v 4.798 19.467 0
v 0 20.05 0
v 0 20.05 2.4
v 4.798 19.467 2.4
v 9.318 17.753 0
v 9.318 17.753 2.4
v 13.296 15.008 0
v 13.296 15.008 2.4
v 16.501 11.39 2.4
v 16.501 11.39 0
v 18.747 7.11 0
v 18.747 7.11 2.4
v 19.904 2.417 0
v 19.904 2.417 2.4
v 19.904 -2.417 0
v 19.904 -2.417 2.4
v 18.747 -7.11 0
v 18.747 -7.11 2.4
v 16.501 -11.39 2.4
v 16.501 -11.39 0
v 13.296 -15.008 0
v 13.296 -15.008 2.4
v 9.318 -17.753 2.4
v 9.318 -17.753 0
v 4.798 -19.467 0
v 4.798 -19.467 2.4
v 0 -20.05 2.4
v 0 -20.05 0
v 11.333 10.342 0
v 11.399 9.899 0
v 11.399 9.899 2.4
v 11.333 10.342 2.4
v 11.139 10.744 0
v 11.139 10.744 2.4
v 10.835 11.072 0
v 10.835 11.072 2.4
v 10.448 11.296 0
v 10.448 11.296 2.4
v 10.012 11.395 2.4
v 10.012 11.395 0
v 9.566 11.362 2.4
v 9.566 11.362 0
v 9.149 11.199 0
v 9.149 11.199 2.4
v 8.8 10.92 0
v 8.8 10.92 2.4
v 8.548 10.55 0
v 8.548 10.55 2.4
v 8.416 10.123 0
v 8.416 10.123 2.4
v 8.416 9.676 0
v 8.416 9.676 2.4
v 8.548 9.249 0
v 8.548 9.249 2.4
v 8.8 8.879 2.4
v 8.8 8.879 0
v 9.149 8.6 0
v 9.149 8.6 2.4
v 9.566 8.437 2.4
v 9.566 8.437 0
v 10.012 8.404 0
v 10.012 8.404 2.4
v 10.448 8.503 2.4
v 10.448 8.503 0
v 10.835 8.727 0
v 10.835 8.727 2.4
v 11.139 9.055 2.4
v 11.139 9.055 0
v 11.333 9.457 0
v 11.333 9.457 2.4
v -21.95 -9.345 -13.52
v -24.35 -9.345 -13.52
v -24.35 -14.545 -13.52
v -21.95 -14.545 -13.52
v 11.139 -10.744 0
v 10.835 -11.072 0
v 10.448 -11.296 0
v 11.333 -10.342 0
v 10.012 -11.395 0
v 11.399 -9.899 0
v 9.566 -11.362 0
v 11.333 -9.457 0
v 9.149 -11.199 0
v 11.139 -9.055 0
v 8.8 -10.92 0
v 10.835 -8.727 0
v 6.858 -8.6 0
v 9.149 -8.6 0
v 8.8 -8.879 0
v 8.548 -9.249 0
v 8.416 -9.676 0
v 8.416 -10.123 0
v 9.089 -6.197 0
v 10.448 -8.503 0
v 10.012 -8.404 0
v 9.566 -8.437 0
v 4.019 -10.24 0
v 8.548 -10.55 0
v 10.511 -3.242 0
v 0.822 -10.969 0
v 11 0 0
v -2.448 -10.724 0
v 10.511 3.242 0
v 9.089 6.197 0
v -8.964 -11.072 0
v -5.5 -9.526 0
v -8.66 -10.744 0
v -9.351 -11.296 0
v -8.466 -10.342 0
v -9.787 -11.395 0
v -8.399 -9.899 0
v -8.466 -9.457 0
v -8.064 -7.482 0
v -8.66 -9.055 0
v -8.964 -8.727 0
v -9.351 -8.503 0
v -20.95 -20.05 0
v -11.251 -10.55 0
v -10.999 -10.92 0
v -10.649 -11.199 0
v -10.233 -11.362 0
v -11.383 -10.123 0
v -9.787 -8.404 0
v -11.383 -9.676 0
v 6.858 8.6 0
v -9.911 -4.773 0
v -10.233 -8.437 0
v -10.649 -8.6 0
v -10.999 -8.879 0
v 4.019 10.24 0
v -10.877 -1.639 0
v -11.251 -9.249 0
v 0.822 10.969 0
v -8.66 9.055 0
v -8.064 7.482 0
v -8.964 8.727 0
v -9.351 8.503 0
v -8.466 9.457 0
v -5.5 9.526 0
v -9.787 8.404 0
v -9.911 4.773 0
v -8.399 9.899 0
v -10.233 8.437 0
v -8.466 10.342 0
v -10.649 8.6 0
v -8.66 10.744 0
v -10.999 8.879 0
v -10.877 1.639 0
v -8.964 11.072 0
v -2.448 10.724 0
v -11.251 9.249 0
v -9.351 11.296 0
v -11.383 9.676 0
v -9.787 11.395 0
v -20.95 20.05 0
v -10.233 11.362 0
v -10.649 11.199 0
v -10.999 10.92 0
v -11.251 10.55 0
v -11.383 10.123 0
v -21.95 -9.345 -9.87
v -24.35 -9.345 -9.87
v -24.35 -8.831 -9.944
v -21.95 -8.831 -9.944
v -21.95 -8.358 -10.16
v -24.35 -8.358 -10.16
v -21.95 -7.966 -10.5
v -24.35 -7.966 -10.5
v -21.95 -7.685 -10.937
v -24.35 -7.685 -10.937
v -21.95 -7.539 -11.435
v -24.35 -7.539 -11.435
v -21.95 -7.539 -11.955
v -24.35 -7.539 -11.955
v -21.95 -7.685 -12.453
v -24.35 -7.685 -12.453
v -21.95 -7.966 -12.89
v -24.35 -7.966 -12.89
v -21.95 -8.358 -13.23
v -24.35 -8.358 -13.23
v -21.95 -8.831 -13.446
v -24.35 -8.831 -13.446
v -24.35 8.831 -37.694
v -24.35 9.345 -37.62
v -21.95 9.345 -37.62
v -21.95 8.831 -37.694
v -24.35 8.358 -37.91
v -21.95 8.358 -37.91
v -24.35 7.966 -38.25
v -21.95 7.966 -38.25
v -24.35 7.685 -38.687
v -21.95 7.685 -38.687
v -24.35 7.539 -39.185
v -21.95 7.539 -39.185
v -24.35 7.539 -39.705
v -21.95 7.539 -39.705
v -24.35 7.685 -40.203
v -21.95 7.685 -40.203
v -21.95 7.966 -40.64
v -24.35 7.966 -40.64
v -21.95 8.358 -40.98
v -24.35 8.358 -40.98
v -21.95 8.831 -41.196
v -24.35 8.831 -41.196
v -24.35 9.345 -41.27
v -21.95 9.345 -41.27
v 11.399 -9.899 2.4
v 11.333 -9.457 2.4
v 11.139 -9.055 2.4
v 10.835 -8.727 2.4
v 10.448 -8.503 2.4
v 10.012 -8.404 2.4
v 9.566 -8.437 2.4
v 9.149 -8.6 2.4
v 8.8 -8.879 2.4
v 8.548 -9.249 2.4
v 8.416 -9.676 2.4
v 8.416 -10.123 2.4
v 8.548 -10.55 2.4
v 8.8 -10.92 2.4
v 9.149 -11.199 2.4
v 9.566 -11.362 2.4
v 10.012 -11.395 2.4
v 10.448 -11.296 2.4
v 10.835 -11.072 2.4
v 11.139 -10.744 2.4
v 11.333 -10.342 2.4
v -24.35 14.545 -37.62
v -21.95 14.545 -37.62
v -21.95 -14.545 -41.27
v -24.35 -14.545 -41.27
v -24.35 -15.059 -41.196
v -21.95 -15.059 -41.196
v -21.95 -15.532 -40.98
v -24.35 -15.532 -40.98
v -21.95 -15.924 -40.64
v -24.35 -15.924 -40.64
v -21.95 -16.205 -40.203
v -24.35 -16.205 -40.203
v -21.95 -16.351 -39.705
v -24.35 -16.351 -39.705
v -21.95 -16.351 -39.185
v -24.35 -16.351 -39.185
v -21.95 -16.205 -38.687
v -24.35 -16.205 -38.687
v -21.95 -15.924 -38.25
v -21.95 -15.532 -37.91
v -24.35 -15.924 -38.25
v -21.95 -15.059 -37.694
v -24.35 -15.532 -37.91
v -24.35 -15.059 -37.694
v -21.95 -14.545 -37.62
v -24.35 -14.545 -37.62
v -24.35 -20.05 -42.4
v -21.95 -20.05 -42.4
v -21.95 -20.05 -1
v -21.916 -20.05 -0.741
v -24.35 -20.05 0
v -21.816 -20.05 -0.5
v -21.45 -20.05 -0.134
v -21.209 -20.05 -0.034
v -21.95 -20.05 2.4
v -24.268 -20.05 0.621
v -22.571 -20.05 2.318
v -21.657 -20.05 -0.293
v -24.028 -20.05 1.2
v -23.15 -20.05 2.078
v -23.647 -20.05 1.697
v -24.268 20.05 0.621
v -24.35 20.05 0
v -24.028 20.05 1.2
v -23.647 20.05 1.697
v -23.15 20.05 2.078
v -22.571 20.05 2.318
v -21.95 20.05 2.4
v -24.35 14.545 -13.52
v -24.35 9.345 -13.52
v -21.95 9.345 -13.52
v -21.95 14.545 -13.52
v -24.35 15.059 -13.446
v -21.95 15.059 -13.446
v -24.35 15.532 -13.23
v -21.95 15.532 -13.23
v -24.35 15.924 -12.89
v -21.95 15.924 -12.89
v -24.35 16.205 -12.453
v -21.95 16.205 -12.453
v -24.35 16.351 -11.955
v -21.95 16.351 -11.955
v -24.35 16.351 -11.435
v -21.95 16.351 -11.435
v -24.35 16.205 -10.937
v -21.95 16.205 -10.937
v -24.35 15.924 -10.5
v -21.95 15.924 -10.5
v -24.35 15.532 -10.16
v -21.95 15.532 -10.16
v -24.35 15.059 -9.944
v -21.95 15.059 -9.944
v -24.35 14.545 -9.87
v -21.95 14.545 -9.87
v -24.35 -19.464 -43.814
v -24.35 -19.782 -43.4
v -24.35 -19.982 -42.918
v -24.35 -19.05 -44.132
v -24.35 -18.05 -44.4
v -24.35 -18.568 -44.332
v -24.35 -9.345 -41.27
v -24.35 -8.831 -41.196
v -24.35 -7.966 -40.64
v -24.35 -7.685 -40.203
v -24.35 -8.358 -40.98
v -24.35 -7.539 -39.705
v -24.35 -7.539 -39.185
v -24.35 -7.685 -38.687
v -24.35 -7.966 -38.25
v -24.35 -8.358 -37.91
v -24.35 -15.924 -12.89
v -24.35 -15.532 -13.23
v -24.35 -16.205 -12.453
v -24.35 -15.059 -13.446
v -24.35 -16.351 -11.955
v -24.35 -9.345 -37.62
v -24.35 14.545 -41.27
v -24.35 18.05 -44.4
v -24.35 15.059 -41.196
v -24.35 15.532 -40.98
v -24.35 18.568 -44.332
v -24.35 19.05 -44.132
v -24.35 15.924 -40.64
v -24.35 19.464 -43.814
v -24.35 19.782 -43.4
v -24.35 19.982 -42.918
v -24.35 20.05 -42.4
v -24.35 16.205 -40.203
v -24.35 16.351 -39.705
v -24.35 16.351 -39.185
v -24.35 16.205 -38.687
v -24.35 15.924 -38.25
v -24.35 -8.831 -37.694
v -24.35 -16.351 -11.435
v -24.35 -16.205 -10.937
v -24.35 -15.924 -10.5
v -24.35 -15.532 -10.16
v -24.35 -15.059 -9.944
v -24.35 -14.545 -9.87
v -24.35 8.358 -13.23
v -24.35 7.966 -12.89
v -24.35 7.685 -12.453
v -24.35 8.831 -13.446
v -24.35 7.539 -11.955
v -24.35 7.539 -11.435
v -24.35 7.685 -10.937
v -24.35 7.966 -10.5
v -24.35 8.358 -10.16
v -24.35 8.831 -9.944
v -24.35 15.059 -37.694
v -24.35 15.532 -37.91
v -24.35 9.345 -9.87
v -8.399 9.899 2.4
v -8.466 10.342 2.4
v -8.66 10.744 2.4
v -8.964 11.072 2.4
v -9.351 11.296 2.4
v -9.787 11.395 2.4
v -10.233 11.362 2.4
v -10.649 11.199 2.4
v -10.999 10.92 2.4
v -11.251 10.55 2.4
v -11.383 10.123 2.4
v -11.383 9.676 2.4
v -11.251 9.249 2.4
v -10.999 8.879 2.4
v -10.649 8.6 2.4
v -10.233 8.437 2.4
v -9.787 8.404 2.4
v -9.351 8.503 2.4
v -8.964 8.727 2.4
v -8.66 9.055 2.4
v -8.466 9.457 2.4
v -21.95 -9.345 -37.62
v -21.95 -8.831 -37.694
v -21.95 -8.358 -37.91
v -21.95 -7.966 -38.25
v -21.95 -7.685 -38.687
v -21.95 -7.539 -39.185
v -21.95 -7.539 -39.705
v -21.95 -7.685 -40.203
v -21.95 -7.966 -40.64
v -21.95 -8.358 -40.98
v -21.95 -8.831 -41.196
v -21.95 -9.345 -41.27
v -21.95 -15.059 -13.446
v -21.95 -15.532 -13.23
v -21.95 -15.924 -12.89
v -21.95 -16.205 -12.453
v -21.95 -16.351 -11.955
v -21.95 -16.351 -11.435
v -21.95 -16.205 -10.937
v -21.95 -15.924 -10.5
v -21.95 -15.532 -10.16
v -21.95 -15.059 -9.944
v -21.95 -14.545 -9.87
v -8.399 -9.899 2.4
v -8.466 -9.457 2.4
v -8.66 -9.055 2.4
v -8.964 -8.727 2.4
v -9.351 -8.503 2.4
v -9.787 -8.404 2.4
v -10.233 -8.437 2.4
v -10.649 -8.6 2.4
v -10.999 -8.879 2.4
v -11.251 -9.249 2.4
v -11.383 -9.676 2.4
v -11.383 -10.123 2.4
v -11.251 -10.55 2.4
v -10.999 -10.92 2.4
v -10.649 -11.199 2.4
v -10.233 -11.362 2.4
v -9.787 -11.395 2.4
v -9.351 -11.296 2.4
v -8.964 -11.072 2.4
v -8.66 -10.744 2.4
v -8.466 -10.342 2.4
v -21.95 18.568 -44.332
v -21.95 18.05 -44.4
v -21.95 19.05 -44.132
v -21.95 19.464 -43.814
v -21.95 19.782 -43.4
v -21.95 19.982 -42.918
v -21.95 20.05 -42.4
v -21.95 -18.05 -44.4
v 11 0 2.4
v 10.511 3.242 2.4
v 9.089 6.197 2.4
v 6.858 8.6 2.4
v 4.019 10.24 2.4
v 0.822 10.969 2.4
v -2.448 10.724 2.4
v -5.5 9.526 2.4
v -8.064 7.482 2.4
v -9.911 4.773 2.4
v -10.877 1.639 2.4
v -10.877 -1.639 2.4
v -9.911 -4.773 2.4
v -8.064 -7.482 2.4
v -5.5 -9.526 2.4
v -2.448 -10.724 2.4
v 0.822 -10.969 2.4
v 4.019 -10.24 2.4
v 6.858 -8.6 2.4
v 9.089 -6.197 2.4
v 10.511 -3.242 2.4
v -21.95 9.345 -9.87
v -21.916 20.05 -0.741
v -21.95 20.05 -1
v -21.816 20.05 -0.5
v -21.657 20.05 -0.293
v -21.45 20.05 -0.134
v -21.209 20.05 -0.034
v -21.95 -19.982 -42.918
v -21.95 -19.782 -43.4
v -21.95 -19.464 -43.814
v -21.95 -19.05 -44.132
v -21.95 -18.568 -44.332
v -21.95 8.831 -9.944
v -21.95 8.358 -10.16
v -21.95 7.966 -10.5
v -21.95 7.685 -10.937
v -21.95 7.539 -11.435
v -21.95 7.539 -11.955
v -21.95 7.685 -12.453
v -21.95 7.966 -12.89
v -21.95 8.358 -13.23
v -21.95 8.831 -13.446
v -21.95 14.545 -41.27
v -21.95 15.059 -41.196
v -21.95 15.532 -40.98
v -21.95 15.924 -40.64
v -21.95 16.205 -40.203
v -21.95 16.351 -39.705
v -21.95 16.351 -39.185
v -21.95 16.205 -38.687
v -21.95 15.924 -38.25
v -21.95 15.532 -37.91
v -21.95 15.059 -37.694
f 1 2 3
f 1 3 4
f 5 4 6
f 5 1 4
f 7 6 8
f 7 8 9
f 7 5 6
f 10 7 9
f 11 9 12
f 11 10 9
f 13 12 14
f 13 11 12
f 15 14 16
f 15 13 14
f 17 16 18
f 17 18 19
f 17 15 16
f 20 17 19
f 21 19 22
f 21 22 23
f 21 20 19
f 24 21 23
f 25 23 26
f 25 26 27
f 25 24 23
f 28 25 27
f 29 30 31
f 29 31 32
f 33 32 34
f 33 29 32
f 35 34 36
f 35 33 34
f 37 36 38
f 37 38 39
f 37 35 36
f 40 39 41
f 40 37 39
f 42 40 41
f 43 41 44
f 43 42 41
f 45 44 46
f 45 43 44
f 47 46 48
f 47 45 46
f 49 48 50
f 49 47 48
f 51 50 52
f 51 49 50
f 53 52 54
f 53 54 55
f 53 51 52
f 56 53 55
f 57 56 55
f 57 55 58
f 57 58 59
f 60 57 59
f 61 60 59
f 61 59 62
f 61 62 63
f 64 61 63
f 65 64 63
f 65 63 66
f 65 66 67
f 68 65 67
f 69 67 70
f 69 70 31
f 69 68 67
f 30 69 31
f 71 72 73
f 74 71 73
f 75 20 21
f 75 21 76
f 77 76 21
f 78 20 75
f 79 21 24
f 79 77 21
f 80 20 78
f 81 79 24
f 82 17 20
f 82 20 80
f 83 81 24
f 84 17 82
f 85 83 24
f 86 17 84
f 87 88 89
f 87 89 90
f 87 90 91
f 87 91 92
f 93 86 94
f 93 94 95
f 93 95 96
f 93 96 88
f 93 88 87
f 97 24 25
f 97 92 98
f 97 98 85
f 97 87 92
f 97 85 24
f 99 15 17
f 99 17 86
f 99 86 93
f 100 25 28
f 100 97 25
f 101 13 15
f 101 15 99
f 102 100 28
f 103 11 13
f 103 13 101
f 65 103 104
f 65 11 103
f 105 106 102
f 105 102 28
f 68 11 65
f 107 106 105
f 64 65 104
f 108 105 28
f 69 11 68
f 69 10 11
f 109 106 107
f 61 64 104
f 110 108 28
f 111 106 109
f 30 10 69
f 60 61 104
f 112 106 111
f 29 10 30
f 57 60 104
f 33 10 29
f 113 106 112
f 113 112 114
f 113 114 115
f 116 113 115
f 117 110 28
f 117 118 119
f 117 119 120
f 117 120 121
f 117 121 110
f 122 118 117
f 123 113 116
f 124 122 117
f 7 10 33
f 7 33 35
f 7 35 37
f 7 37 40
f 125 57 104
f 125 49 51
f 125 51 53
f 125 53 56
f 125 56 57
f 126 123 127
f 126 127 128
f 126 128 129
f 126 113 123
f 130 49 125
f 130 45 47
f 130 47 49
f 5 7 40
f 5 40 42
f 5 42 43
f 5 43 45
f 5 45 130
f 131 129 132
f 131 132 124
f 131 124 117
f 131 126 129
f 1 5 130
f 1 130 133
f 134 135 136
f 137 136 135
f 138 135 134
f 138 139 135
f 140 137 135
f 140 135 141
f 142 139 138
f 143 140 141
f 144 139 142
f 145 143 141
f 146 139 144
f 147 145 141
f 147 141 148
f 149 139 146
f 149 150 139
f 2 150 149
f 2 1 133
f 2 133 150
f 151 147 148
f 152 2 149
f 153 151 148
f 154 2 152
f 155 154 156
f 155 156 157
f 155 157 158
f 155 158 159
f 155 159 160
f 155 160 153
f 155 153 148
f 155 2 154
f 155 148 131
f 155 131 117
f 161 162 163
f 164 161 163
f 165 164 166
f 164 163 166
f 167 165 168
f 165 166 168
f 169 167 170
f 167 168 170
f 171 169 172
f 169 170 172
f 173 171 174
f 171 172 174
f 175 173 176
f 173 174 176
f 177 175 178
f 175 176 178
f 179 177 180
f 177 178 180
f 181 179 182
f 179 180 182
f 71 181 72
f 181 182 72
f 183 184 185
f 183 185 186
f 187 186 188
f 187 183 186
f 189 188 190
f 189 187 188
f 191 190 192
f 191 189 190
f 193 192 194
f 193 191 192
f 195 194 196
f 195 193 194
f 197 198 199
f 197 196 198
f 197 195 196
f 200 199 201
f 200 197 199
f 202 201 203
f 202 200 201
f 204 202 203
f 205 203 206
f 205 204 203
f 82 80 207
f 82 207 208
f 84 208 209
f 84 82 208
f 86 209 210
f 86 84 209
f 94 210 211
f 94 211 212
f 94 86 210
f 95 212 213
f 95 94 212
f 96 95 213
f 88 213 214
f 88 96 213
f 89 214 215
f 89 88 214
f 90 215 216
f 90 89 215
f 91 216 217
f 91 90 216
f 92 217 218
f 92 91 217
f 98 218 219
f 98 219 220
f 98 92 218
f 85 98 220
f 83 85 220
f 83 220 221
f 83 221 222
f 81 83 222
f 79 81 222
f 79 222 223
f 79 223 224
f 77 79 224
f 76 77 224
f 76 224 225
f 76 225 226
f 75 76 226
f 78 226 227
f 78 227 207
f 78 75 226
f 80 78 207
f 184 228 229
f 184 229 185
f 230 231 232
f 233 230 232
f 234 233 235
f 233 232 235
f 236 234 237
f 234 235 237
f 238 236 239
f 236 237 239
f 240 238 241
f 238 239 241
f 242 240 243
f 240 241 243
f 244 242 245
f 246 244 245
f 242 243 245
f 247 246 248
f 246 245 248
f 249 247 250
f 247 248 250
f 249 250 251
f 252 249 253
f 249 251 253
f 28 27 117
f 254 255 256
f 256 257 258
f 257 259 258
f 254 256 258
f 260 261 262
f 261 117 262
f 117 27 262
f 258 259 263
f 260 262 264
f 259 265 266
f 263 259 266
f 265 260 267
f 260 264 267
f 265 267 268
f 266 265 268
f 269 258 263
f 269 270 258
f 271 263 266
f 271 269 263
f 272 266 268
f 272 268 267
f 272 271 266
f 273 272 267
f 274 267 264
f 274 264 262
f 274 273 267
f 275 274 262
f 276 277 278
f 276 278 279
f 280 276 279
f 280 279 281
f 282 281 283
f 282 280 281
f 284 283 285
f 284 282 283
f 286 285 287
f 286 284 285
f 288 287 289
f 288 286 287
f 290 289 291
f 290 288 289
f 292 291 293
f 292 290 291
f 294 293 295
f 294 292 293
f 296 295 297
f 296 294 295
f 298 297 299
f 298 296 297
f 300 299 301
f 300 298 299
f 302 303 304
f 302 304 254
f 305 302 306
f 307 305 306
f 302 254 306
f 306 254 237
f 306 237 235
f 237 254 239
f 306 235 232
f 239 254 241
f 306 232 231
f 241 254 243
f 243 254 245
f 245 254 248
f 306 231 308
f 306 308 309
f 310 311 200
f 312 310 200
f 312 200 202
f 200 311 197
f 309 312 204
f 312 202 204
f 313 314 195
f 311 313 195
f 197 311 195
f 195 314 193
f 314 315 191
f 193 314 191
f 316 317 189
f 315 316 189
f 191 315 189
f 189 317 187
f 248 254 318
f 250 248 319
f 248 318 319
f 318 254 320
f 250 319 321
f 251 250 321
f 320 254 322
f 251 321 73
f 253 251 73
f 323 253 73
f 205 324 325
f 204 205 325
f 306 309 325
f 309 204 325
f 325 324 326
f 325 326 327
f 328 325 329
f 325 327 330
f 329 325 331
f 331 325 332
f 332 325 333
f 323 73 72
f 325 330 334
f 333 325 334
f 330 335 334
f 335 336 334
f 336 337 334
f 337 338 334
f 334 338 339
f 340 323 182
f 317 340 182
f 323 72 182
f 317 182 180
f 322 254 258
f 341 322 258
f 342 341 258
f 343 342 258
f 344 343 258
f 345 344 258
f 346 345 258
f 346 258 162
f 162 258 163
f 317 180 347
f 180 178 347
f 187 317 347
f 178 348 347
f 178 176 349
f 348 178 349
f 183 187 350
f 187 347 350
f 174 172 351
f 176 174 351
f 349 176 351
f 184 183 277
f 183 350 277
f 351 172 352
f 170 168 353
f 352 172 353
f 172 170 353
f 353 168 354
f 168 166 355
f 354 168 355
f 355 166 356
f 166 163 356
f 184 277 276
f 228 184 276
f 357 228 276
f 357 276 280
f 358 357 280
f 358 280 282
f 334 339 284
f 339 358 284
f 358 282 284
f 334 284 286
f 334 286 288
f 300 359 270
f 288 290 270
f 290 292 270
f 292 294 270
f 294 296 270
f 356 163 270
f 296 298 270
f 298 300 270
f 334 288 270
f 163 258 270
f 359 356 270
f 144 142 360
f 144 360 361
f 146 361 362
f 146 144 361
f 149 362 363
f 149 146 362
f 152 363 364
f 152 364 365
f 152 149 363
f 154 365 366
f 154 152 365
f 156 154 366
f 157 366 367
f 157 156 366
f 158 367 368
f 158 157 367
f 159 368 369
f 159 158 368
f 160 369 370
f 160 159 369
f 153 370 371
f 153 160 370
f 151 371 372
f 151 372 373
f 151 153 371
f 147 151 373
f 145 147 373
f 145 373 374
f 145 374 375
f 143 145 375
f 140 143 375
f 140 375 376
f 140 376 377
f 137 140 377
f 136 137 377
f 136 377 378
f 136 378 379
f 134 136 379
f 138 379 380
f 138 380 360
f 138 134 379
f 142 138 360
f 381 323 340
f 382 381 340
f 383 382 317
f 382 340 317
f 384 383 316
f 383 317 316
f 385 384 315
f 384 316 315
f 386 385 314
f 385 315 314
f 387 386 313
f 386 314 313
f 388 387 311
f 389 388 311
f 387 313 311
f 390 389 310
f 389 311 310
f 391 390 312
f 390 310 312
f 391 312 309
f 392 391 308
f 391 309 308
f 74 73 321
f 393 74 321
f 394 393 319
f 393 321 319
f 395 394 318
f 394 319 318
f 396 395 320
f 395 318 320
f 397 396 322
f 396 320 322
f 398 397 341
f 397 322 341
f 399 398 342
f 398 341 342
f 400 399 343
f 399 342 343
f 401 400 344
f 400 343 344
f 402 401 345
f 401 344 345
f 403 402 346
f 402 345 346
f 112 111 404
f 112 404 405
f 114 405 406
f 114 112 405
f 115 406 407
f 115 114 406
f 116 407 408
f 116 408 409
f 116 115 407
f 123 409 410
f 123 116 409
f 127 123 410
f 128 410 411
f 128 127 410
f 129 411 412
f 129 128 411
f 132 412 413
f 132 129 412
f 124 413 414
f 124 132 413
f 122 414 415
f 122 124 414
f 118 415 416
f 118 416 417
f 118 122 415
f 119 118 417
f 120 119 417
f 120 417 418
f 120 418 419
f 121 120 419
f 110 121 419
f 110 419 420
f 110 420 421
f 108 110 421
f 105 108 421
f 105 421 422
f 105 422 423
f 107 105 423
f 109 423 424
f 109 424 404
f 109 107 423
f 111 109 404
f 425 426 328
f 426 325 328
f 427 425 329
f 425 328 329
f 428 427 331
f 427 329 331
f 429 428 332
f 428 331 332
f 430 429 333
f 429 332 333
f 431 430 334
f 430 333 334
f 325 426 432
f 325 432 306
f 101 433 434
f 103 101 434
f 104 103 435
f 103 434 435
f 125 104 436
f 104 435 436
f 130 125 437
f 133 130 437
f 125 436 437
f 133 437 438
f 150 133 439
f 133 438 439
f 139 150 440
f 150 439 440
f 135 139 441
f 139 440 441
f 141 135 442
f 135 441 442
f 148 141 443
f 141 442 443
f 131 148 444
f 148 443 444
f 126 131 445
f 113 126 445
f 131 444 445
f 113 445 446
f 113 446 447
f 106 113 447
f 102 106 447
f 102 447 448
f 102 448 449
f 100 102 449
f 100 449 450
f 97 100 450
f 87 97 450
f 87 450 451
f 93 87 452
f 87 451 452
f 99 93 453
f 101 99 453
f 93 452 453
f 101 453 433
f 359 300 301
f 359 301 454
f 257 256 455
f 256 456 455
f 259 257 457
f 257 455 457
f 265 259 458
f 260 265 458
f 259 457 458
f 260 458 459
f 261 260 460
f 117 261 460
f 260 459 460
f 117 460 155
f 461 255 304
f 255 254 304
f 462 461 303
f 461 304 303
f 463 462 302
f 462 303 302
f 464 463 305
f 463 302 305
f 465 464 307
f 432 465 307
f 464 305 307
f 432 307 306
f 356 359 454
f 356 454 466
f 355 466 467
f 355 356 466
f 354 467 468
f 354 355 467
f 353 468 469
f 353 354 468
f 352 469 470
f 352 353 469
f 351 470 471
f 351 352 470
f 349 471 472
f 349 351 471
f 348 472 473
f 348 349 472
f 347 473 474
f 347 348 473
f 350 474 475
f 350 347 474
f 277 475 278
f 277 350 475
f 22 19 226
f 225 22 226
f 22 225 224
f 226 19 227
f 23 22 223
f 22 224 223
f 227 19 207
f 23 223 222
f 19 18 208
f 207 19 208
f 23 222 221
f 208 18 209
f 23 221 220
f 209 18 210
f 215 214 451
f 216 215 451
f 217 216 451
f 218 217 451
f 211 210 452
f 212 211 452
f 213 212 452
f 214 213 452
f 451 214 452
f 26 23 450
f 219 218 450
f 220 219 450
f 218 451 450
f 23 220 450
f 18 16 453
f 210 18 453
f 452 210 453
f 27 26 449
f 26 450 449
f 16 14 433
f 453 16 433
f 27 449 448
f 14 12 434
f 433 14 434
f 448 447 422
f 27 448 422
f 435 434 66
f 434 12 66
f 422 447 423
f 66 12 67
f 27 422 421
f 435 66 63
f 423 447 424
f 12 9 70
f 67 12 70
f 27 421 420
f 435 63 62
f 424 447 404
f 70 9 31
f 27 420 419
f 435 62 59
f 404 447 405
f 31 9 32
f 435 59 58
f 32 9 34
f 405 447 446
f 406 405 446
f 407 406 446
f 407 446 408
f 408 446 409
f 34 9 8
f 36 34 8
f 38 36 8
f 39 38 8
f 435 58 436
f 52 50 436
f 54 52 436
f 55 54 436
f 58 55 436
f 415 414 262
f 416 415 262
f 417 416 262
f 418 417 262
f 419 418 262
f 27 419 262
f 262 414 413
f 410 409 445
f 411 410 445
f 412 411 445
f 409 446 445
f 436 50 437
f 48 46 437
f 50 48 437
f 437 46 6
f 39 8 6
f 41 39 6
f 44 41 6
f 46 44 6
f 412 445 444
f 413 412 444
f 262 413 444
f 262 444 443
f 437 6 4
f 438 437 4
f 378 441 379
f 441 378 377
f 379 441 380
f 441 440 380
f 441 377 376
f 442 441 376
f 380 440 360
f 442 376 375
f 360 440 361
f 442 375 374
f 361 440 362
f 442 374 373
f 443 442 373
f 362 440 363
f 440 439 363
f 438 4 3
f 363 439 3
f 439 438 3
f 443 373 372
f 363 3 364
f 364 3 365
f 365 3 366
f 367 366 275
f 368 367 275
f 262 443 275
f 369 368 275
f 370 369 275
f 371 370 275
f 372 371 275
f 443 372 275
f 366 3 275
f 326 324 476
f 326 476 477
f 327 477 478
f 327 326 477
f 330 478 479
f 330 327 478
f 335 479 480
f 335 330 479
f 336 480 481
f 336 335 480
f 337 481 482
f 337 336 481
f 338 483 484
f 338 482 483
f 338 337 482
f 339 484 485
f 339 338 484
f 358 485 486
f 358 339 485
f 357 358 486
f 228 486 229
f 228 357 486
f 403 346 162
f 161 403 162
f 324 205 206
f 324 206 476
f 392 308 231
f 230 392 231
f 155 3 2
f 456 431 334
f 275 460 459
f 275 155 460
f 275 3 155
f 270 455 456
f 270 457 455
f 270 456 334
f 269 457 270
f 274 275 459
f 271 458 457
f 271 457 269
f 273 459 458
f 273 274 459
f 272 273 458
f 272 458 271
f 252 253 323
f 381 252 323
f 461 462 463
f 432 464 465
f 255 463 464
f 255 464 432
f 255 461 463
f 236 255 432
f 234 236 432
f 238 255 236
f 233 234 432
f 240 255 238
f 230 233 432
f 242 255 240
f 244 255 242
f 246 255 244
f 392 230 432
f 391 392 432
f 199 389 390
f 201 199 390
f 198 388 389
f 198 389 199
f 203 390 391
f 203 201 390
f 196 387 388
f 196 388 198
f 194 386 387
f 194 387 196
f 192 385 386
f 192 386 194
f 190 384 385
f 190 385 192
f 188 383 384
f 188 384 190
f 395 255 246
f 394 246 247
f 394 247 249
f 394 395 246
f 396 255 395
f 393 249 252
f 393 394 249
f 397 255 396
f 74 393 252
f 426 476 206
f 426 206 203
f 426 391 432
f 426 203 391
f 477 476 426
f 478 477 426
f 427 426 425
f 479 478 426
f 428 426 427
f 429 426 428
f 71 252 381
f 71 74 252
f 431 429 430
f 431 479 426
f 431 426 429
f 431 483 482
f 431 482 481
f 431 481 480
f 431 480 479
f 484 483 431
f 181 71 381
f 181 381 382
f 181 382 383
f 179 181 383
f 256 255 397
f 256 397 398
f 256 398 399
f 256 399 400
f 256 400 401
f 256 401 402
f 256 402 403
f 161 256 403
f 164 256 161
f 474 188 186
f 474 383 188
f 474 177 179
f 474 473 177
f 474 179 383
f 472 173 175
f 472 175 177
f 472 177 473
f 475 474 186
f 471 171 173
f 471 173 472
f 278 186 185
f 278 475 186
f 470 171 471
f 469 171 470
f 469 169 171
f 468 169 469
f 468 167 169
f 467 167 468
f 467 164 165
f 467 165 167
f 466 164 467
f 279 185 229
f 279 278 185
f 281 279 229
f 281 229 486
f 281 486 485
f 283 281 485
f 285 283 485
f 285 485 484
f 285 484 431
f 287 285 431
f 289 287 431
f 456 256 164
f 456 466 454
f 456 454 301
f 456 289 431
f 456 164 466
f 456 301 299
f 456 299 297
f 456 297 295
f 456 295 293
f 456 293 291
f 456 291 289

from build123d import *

# Parameters (mm, degrees)
SKETCH1_R           = 1.5
BOSS_EXTRUDE1_DEPTH = 2.4
SKETCH2_W           = 2.4
SKETCH2_H           = 40.1
BOSS_EXTRUDE2_DEPTH = 44.4
FILLET2_R           = 1
FILLET3_R           = 2.4
FILLET4_R           = 2
CUT_EXTRUDE1_DEPTH  = 45.4
SKETCH4_R           = 4
CUT_EXTRUDE2_DEPTH  = 2.4
SKETCH5_R           = 11
CUT_EXTRUDE3_DEPTH  = 2.4


with BuildPart() as part:
    # Sketch1 → Boss-Extrude1 (new body)
    with BuildSketch(Plane.XY):
        with BuildLine():
            Line((0, -20.05), (-24.35, -20.05))
            Line((-24.35, -20.05), (-24.35, 20.05))
            Line((-24.35, 20.05), (0, 20.05))
            ThreePointArc((0, 20.05), (20.05, 0), (0, -20.05))
        make_face()
        with Locations((-9.899494937, -9.899494937)):
            Circle(SKETCH1_R, mode=Mode.SUBTRACT)
        with Locations((-9.899494937, 9.899494937)):
            Circle(SKETCH1_R, mode=Mode.SUBTRACT)
        with Locations((9.899494937, 9.899494937)):
            Circle(SKETCH1_R, mode=Mode.SUBTRACT)
        with Locations((9.899494937, -9.899494937)):
            Circle(SKETCH1_R, mode=Mode.SUBTRACT)
    extrude(amount=BOSS_EXTRUDE1_DEPTH)

    # Sketch2 → Boss-Extrude2 (add)
    with BuildSketch(Plane(origin=(0, 0, 0), x_dir=(-1, 0, 0), z_dir=(0, 0, -1))):
        with Locations((23.15, 0)):
            Rectangle(SKETCH2_W, SKETCH2_H)
    extrude(amount=BOSS_EXTRUDE2_DEPTH)

    # Fillet2
    fillet2_edges = [part.edges().sort_by_distance(p)[0] for p in [
        (-21.95, 0, 0),
    ]]
    fillet(fillet2_edges, radius=FILLET2_R)

    # Fillet3
    fillet3_edges = [part.edges().sort_by_distance(p)[0] for p in [
        (-24.35, 0, 2.4),
    ]]
    fillet(fillet3_edges, radius=FILLET3_R)

    # Fillet4
    fillet4_edges = [part.edges().sort_by_distance(p)[0] for p in [
        (-23.15, 20.05, -44.4),
        (-23.15, -20.05, -44.4),
    ]]
    fillet(fillet4_edges, radius=FILLET4_R)

    # Sketch3 → Cut-Extrude1 (cut, through all)
    with BuildSketch(Plane.ZY.offset(24.35)):
        with BuildLine():
            Line((-41.27, 9.345), (-41.27, 14.545))
            ThreePointArc((-41.27, 14.545), (-39.445, 16.37), (-37.62, 14.545))
            Line((-37.62, 14.545), (-37.62, 9.345))
            ThreePointArc((-37.62, 9.345), (-39.445, 7.52), (-41.27, 9.345))
        make_face()
        with BuildLine():
            Line((-13.52, 9.345), (-13.52, 14.545))
            ThreePointArc((-13.52, 14.545), (-11.695, 16.37), (-9.87, 14.545))
            Line((-9.87, 14.545), (-9.87, 9.345))
            ThreePointArc((-9.87, 9.345), (-11.695, 7.52), (-13.52, 9.345))
        make_face()
        with BuildLine():
            Line((-41.27, -9.345), (-41.27, -14.545))
            ThreePointArc((-41.27, -14.545), (-39.445, -16.37), (-37.62, -14.545))
            Line((-37.62, -14.545), (-37.62, -9.345))
            ThreePointArc((-37.62, -9.345), (-39.445, -7.52), (-41.27, -9.345))
        make_face()
        with BuildLine():
            Line((-13.52, -9.345), (-13.52, -14.545))
            ThreePointArc((-13.52, -14.545), (-11.695, -16.37), (-9.87, -14.545))
            Line((-9.87, -14.545), (-9.87, -9.345))
            ThreePointArc((-9.87, -9.345), (-11.695, -7.52), (-13.52, -9.345))
        make_face()
    extrude(amount=-CUT_EXTRUDE1_DEPTH, mode=Mode.SUBTRACT)

    # Sketch4 → Cut-Extrude2 (cut)
    with BuildSketch(Plane.XY.offset(2.4)):
        Circle(SKETCH4_R)
    extrude(amount=-CUT_EXTRUDE2_DEPTH, mode=Mode.SUBTRACT)

    # Sketch5 → Cut-Extrude3 (cut)
    with BuildSketch(Plane.XY.offset(2.4)):
        Circle(SKETCH5_R)
    extrude(amount=-CUT_EXTRUDE3_DEPTH, mode=Mode.SUBTRACT)


solid = part.part
